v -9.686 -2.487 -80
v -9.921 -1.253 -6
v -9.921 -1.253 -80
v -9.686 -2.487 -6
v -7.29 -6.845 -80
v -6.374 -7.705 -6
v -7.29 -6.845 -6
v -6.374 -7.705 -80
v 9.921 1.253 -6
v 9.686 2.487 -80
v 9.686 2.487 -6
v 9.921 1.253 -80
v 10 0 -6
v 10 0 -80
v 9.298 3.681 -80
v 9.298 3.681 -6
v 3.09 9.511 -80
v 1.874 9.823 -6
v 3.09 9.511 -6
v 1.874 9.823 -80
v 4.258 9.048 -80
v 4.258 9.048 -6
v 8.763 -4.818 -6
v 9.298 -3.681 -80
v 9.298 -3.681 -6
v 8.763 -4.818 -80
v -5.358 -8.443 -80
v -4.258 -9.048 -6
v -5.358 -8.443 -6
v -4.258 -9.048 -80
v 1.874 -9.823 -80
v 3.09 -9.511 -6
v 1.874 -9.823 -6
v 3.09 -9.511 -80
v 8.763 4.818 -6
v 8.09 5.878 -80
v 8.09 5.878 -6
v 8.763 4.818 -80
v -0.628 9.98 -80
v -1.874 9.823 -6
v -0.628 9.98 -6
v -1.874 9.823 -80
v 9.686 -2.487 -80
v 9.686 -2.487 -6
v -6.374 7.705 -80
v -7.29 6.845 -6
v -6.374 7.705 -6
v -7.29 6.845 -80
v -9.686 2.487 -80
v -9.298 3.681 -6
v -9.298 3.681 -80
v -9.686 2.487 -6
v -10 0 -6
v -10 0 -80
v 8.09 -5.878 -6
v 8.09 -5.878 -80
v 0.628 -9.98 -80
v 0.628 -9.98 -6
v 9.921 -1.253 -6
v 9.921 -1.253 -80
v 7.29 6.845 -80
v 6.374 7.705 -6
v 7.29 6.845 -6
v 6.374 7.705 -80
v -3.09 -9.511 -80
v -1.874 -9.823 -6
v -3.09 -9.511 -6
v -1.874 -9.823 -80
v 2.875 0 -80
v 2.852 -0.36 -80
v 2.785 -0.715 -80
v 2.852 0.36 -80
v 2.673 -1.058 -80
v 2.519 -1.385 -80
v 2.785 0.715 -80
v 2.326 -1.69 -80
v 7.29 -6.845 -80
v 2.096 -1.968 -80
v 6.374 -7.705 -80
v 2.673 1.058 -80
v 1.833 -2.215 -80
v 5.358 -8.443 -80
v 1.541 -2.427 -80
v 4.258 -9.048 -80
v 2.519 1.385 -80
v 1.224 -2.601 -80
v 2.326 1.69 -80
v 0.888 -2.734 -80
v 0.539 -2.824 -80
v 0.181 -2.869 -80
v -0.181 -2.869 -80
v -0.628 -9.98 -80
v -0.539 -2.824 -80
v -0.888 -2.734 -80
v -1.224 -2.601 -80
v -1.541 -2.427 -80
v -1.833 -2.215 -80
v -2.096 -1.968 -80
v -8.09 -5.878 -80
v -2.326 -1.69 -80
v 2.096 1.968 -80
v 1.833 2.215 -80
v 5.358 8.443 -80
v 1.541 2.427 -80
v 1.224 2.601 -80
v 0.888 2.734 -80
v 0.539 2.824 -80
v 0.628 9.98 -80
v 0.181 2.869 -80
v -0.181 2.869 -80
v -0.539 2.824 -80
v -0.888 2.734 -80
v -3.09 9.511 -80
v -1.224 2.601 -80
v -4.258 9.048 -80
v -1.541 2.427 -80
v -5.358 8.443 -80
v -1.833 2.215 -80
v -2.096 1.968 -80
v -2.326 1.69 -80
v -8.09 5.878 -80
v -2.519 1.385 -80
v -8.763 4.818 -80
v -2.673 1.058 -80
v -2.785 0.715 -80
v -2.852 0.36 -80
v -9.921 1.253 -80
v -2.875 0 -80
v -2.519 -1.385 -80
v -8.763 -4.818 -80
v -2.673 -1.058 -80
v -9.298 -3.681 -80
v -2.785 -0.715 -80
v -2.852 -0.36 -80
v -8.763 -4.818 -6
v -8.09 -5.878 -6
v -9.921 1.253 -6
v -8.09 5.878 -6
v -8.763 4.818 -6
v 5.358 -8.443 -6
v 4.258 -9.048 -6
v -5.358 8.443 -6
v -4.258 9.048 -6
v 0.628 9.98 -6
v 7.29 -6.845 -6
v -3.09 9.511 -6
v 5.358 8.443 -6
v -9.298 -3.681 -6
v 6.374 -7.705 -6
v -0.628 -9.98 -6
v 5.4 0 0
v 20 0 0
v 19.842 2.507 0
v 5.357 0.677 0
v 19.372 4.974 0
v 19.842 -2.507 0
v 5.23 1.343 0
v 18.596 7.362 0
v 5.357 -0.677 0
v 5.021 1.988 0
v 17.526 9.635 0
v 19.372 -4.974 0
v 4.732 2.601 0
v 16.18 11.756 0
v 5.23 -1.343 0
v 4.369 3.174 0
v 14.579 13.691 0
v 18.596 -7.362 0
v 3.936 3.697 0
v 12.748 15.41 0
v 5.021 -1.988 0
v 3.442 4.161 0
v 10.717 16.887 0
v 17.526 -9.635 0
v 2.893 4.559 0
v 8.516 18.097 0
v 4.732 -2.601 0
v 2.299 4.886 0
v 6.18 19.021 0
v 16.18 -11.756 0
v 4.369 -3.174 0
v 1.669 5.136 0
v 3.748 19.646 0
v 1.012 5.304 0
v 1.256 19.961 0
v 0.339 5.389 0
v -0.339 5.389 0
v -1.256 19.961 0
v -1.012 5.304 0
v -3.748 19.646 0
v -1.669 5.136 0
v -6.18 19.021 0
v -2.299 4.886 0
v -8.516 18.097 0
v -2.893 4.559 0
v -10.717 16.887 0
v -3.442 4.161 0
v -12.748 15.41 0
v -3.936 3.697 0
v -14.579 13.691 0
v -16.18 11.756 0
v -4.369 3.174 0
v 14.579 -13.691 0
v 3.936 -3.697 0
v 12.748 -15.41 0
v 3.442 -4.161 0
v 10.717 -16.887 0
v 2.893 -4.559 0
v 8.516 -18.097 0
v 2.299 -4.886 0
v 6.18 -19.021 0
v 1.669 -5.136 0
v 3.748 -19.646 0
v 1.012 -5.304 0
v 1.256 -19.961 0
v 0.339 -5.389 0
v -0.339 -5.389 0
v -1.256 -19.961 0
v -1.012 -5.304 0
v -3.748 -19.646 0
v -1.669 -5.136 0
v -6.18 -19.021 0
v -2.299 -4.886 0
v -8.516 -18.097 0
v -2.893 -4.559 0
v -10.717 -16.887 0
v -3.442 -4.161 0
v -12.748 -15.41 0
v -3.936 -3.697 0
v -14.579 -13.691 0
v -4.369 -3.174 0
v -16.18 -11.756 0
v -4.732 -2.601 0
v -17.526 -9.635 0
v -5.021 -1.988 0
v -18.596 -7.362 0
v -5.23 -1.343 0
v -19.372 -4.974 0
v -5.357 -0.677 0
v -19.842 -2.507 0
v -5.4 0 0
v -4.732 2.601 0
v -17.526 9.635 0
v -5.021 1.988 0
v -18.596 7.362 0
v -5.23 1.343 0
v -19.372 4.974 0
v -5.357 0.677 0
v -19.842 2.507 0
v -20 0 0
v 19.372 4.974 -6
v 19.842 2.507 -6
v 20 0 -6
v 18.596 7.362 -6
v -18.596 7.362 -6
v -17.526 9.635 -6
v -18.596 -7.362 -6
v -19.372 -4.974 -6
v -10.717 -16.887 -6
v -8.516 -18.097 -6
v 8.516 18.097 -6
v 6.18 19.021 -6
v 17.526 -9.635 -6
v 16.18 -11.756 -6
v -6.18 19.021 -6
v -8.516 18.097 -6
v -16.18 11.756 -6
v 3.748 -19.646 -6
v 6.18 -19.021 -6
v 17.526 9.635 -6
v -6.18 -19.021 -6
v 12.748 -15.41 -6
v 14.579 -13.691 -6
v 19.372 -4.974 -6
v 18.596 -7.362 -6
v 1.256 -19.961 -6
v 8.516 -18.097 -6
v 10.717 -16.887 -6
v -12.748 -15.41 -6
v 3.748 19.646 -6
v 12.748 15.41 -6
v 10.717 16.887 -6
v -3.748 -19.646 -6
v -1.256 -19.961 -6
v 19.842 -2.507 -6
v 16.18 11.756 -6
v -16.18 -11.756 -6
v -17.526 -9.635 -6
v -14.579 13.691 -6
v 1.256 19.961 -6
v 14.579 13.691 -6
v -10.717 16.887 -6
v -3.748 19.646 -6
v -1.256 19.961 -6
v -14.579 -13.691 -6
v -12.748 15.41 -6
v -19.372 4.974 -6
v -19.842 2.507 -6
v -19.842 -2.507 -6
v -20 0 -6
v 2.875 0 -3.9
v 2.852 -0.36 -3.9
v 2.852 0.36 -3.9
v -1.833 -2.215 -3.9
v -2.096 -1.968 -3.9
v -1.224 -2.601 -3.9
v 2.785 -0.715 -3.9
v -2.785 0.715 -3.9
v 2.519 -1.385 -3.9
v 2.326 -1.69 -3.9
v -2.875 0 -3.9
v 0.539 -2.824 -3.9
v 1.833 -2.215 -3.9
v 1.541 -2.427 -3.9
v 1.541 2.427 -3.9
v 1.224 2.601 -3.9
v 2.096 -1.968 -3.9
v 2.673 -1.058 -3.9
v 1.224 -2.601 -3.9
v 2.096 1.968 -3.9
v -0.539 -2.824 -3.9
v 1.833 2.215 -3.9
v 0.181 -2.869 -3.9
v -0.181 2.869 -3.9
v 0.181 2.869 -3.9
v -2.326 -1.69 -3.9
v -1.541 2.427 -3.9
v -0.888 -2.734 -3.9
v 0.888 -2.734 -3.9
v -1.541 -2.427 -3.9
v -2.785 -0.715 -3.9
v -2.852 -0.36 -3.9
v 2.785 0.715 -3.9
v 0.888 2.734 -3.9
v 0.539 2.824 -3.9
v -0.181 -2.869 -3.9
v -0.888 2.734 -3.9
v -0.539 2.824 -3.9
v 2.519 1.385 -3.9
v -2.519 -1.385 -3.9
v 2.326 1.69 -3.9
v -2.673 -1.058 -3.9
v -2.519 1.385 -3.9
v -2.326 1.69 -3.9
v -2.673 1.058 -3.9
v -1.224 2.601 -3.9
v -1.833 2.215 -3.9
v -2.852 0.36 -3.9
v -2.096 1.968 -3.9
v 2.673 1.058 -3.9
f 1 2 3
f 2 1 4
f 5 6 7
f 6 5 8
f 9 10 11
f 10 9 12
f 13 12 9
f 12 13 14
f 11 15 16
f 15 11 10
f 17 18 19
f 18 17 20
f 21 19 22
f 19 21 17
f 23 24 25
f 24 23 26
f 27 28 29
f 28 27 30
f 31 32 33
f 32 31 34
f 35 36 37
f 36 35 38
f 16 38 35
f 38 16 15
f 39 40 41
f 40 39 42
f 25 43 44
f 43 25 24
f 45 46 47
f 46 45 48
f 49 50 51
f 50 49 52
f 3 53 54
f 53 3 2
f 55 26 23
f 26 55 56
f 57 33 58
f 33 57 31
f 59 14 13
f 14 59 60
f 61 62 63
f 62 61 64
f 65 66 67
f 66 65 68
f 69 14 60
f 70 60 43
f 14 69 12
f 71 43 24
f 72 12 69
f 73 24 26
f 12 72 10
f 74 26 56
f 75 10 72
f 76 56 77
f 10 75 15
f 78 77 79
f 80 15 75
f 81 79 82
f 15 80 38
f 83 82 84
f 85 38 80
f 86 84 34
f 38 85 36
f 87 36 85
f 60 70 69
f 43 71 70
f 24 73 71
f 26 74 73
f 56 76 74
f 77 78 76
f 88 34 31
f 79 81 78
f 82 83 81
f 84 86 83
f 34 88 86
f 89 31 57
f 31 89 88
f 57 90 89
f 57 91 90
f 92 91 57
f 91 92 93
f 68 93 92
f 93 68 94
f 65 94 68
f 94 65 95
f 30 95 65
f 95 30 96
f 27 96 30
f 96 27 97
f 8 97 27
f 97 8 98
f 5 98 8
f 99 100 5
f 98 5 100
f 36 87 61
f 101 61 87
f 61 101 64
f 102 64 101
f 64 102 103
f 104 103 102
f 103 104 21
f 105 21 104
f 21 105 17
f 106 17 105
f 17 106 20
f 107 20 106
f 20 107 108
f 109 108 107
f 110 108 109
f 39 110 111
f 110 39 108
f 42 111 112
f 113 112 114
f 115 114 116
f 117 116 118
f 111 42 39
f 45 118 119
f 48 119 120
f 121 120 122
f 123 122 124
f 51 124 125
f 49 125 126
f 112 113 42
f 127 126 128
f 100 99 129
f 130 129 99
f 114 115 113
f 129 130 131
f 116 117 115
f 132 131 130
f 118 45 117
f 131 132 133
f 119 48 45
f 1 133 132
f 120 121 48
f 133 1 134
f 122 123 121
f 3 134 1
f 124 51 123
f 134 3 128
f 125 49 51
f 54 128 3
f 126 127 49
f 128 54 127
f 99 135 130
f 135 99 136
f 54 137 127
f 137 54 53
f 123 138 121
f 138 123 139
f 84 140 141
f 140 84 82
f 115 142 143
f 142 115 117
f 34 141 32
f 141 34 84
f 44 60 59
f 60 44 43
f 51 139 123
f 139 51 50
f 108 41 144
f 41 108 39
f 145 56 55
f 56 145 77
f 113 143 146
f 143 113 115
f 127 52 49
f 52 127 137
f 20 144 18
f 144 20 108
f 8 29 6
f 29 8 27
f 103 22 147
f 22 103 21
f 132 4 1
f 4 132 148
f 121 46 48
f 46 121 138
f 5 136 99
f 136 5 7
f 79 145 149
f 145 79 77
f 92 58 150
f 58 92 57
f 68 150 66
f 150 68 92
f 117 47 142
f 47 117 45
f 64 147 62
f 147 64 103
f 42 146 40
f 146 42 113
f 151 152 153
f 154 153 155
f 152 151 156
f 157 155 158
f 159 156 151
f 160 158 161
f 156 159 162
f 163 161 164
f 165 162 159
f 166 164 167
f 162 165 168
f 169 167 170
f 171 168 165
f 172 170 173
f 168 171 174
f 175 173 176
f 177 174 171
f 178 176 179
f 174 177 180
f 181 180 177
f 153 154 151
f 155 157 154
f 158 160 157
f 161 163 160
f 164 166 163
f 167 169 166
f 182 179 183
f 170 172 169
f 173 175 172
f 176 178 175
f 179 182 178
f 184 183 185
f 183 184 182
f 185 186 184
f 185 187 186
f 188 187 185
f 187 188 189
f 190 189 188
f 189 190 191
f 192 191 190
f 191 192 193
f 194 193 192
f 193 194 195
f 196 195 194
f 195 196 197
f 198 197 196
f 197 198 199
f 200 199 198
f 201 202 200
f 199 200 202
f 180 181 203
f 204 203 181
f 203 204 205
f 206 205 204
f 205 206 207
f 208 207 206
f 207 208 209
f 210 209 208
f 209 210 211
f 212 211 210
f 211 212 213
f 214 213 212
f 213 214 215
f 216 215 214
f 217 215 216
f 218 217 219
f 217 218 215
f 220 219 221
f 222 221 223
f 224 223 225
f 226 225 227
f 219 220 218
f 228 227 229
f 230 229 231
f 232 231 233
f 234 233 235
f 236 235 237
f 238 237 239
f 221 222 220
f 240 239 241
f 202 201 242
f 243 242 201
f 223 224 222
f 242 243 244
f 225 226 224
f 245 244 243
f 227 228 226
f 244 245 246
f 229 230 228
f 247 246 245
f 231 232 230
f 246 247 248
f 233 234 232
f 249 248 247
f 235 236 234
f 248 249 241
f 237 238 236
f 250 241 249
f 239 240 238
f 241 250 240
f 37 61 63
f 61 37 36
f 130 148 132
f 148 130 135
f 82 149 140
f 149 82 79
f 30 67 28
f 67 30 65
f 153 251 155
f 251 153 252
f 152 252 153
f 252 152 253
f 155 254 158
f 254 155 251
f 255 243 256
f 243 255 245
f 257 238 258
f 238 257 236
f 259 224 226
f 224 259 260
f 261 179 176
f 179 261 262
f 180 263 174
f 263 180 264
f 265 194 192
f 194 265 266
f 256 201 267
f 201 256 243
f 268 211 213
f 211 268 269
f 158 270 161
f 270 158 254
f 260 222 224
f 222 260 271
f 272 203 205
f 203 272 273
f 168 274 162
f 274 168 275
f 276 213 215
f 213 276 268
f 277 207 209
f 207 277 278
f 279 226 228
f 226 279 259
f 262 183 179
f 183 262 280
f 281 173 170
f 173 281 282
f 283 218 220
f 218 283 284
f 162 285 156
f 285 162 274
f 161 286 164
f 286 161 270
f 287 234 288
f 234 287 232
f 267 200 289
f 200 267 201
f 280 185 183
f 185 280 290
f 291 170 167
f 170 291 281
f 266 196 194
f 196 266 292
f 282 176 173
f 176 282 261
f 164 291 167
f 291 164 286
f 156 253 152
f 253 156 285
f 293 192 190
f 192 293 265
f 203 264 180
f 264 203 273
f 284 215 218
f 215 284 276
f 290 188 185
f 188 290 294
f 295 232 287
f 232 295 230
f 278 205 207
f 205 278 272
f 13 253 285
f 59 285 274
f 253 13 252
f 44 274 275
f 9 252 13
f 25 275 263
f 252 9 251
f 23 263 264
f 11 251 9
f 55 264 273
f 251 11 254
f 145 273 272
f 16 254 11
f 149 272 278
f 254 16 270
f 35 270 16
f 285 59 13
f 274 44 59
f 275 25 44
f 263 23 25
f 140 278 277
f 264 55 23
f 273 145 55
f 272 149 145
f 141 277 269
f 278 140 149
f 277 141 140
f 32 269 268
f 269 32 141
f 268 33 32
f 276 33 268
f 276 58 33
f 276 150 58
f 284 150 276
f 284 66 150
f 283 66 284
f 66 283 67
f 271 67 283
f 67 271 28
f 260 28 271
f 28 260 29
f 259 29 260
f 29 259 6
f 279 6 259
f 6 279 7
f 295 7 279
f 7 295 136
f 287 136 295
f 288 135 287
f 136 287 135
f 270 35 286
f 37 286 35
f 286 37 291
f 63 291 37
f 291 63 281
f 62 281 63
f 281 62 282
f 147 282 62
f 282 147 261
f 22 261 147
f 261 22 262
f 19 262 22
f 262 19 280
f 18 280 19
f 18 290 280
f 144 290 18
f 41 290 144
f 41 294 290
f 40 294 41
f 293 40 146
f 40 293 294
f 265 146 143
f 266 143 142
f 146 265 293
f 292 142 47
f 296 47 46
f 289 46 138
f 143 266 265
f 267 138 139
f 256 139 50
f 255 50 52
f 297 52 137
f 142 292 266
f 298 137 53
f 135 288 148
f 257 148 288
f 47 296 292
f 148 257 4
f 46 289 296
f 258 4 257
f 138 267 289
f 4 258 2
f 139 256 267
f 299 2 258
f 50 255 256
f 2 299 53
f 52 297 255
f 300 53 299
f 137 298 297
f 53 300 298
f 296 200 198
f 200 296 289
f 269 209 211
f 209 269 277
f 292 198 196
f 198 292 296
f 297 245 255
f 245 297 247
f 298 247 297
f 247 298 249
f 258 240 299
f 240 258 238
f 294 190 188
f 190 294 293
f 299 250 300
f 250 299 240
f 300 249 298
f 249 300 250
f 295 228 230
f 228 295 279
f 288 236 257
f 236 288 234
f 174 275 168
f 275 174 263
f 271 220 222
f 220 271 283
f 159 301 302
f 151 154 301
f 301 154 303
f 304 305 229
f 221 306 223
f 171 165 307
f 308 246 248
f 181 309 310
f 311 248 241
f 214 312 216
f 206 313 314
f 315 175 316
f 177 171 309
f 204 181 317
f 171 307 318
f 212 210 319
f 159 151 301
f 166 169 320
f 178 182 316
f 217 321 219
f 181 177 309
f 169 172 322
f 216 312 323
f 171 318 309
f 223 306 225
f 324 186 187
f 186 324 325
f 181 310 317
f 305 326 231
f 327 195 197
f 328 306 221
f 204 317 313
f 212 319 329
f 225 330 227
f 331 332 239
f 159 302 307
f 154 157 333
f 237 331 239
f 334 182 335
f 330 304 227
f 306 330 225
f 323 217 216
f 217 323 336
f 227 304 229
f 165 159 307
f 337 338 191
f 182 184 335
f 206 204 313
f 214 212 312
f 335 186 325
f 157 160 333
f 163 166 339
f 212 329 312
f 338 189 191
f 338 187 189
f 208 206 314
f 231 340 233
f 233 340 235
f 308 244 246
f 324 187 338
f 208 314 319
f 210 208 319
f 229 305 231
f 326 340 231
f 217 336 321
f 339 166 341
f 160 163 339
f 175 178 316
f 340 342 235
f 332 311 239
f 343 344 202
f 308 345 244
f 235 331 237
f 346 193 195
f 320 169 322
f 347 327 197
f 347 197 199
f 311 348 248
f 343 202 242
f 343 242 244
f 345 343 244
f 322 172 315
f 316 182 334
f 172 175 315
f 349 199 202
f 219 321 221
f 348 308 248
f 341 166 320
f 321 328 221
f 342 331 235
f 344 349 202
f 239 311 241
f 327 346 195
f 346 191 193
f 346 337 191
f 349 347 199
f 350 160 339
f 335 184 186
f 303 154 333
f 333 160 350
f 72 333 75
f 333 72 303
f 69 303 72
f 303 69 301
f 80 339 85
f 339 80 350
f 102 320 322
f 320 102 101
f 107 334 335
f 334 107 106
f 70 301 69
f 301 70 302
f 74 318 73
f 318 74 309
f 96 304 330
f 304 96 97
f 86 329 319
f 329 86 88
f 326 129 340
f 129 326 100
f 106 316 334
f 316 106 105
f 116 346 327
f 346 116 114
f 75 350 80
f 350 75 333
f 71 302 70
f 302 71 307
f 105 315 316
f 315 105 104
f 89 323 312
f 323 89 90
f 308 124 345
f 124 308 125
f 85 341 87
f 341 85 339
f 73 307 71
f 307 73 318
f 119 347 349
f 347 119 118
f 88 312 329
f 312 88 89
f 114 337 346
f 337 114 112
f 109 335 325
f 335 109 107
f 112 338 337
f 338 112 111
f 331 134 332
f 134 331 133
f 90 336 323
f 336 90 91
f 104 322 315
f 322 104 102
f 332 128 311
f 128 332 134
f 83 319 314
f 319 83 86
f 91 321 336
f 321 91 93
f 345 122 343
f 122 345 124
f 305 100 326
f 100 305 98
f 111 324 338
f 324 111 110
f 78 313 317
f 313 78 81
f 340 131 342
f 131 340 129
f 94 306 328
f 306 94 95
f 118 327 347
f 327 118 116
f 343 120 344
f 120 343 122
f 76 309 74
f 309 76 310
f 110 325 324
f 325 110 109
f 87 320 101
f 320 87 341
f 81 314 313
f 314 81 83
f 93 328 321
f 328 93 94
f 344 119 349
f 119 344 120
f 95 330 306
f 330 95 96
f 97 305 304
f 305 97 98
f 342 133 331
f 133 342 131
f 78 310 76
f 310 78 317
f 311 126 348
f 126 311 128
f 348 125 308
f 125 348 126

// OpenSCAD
$fn = 50;


difference() {
	union() {
		translate(v = [0, 0, -80.0000000000]) {
			cylinder(h = 80, r = 10.0000000000);
		}
		translate(v = [0, 0, -6.0000000000]) {
			cylinder(h = 6, r = 20.0000000000);
		}
	}
	union() {
		translate(v = [0, 0, 0]) {
			rotate(a = [0, 0, 0]) {
				difference() {
					union() {
						#translate(v = [0, 0, -80.0000000000]) {
							cylinder(h = 80, r = 2.6000000000);
						}
						#translate(v = [0, 0, -3.9000000000]) {
							cylinder(h = 3.9000000000, r = 10.0000000000, r1 = 2.8750000000, r2 = 5.4000000000);
						}
						#translate(v = [0, 0, -80.0000000000]) {
							cylinder(h = 80, r = 2.8750000000);
						}
						#translate(v = [0, 0, -80.0000000000]) {
							cylinder(h = 80, r = 2.6000000000);
						}
					}
					union();
				}
			}
		}
	}
}
